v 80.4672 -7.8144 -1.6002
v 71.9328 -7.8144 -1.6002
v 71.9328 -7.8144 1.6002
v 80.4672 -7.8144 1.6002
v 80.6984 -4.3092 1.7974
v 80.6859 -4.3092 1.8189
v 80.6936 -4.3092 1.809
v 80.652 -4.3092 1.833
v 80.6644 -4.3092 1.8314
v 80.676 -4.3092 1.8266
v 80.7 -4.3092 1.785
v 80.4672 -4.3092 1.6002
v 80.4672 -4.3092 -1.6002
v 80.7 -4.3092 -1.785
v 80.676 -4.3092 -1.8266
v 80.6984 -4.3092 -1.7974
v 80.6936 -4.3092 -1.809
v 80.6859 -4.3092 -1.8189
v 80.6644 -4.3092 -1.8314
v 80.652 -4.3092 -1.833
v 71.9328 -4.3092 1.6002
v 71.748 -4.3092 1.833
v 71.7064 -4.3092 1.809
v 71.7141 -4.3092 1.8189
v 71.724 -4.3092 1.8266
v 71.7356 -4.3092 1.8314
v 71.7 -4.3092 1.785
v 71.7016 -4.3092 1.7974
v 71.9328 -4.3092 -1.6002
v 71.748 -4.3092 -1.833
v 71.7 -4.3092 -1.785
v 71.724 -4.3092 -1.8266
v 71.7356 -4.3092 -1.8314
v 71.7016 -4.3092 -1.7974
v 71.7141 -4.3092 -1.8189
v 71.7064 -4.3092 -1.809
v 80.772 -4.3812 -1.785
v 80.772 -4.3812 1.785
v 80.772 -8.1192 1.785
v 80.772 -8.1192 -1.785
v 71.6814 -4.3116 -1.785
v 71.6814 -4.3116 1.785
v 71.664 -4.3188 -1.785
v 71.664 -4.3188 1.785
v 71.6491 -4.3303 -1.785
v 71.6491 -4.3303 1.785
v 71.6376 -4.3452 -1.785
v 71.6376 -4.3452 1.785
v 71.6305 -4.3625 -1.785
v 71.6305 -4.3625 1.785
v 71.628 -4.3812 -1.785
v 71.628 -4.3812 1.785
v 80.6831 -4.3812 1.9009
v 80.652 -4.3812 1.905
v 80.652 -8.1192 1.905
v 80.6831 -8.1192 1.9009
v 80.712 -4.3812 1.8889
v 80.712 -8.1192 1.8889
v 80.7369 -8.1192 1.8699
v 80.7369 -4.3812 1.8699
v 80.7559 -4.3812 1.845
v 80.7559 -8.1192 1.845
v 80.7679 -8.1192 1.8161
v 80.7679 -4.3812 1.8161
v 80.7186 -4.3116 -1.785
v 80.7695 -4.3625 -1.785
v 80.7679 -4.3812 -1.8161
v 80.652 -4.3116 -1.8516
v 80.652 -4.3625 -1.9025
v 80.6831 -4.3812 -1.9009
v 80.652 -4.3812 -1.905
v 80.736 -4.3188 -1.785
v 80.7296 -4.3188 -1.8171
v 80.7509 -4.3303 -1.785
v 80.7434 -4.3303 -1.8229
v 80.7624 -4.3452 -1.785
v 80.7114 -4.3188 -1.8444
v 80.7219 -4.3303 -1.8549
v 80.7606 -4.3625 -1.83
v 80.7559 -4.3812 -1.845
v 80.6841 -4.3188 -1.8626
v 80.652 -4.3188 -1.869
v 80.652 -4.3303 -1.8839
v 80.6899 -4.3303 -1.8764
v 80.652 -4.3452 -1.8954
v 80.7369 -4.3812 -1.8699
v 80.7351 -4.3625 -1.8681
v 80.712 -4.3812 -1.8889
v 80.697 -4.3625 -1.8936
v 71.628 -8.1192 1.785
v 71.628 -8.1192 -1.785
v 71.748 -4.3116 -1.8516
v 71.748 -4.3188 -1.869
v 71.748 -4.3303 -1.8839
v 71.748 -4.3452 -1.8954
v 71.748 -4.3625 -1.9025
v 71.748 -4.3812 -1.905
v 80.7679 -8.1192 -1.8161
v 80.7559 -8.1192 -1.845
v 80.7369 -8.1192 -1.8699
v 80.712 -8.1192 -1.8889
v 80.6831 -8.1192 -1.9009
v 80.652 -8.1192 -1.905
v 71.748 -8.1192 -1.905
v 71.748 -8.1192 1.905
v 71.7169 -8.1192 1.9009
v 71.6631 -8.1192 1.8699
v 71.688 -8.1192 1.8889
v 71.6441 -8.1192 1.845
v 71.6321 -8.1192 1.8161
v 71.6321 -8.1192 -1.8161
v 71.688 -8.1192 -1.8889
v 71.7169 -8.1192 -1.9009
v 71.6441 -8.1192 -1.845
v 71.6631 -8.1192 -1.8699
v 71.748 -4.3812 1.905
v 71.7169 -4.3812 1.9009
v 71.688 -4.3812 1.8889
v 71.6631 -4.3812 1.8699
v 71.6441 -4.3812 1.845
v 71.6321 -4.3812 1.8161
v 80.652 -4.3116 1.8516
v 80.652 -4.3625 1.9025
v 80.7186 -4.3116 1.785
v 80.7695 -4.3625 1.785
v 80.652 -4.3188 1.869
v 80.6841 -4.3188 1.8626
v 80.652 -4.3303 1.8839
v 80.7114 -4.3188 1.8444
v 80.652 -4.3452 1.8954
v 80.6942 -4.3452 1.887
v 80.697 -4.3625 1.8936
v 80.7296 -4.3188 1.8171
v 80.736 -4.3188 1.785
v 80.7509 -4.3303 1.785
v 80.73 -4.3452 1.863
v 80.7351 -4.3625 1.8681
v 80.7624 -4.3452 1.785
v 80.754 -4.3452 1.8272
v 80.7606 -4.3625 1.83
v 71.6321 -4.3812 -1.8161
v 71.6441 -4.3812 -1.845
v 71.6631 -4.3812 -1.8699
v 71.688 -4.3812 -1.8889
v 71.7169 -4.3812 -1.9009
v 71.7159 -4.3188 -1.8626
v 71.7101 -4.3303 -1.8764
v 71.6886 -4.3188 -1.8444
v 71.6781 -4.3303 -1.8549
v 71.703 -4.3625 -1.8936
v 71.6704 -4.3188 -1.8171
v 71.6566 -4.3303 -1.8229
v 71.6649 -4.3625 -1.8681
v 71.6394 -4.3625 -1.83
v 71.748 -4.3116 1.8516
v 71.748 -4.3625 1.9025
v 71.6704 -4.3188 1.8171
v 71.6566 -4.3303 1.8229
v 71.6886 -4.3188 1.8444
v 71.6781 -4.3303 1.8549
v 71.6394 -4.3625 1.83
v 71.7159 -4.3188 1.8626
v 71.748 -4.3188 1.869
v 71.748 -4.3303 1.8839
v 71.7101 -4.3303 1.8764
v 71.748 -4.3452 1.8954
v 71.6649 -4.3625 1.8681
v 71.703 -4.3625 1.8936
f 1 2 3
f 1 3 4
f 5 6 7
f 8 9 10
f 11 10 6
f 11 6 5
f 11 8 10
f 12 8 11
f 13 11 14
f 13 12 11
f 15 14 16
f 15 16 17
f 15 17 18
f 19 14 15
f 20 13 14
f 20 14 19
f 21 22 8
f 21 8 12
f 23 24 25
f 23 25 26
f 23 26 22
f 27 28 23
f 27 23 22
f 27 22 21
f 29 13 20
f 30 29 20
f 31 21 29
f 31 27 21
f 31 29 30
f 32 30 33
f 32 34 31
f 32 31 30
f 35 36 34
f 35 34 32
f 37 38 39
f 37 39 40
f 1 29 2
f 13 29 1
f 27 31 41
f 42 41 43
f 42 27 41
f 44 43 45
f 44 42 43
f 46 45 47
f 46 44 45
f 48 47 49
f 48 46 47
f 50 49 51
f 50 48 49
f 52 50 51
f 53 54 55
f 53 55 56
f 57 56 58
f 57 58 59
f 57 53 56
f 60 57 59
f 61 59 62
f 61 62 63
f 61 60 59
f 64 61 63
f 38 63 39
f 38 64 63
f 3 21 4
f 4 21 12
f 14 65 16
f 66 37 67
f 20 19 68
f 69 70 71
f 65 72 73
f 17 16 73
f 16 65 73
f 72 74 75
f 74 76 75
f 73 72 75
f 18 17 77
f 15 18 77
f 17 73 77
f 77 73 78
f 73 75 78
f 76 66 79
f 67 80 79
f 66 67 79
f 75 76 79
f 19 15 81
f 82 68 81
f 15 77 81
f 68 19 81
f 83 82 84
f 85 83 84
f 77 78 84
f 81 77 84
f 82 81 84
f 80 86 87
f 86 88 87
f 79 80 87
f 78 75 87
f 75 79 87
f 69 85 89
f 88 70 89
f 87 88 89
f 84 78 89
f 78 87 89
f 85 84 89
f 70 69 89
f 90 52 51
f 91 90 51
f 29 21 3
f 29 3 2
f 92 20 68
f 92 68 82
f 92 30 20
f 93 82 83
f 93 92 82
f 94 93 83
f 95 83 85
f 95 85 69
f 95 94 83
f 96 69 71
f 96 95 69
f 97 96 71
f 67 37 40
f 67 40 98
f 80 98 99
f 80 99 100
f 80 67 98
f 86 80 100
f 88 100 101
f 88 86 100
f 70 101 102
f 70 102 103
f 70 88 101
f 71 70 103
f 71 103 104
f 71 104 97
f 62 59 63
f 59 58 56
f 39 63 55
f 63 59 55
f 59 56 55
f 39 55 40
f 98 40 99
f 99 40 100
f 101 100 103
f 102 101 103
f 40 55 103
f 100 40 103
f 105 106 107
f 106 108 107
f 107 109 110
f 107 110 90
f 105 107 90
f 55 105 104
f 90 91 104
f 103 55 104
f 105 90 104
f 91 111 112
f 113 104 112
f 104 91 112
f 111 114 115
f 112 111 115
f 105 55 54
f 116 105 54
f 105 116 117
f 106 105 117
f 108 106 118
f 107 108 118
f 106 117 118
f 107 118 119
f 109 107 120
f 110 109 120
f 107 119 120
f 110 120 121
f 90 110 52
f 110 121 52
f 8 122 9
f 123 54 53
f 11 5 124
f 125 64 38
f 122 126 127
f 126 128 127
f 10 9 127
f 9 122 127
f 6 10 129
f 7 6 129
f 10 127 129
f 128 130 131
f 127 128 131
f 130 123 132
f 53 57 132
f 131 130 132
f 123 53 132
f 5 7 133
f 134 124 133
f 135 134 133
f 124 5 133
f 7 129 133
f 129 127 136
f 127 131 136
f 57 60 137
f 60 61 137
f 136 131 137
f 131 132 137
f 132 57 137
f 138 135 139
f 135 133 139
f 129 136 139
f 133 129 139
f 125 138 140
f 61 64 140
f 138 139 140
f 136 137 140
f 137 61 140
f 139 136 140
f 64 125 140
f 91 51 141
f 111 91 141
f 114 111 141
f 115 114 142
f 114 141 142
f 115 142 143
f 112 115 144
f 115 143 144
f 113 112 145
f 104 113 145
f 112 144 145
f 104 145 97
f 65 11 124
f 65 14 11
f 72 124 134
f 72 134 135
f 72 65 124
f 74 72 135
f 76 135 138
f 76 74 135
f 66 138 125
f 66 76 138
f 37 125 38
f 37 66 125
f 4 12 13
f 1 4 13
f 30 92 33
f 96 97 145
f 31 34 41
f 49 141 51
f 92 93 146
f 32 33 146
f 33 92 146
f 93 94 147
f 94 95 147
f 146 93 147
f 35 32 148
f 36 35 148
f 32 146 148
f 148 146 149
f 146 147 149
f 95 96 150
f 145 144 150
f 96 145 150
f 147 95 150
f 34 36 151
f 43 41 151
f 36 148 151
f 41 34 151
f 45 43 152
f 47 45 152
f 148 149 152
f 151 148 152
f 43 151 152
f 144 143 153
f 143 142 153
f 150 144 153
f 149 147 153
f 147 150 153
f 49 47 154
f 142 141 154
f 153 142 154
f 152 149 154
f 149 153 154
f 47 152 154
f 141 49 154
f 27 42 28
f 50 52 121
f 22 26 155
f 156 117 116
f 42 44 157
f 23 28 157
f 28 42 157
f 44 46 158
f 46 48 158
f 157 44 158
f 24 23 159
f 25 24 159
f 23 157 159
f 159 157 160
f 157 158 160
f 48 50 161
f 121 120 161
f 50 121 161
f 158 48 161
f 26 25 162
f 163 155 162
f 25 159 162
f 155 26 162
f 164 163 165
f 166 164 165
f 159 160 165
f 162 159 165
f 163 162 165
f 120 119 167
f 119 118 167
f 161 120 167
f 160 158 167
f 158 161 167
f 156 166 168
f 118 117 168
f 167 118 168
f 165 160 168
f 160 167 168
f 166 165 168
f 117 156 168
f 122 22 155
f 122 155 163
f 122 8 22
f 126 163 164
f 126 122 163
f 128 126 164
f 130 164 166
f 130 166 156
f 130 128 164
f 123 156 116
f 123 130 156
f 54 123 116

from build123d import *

# Parameters (mm, degrees)
SKETCH1_W           = 63.5
SKETCH1_H           = 63.5
BOSS_EXTRUDE1_DEPTH = 152.4
SKETCH2_W           = 142.24
SKETCH2_H           = 53.34
CUT_EXTRUDE1_DEPTH  = 58.42
FILLET1_R           = 2
FILLET2_R           = 1.2
SCALE1_SCALE        = 0.06


with BuildPart() as part:
    # Sketch1 → Boss-Extrude1 (new body)
    with BuildSketch(Plane(origin=(0, 0, 0), x_dir=(0, 0, -1), z_dir=(1, 0, 0))):
        Rectangle(SKETCH1_W, SKETCH1_H)
    extrude(amount=BOSS_EXTRUDE1_DEPTH)

    # Sketch2 → Cut-Extrude1 (cut)
    with BuildSketch(Plane(origin=(0, 31.75, 0), x_dir=(1, 0, 0), z_dir=(0, 1, 0))):
        with Locations((76.2, 0)):
            Rectangle(SKETCH2_W, SKETCH2_H)
    extrude(amount=-CUT_EXTRUDE1_DEPTH, mode=Mode.SUBTRACT)

    # Fillet1
    fillet1_edges = [part.edges().sort_by_distance(p)[0] for p in [
        (152.4, 0, 31.75),
        (152.4, 0, -31.75),
        (0, 0, 31.75),
        (0, 0, -31.75),
    ]]
    fillet(fillet1_edges, radius=FILLET1_R)

    # Fillet2
    fillet2_edges = [part.edges().sort_by_distance(p)[0] for p in [
        (152.4, 31.75, 0),
        (76.2, 31.75, 31.75),
        (0, 31.75, 0),
        (76.2, 31.75, -31.75),
        (0.585786438, 31.75, 31.164213562),
        (0.585786438, 31.75, -31.164213562),
        (151.814213562, 31.75, -31.164213562),
        (151.814213562, 31.75, 31.164213562),
    ]]
    fillet(fillet2_edges, radius=FILLET2_R)


with BuildPart() as part_1:
    # Scale1: scaled about (76.2, -6.610828931, 0)
    add(part.part.scale(SCALE1_SCALE).moved(Location((71.628, -6.214179195, 0))))


solid = part_1.part
